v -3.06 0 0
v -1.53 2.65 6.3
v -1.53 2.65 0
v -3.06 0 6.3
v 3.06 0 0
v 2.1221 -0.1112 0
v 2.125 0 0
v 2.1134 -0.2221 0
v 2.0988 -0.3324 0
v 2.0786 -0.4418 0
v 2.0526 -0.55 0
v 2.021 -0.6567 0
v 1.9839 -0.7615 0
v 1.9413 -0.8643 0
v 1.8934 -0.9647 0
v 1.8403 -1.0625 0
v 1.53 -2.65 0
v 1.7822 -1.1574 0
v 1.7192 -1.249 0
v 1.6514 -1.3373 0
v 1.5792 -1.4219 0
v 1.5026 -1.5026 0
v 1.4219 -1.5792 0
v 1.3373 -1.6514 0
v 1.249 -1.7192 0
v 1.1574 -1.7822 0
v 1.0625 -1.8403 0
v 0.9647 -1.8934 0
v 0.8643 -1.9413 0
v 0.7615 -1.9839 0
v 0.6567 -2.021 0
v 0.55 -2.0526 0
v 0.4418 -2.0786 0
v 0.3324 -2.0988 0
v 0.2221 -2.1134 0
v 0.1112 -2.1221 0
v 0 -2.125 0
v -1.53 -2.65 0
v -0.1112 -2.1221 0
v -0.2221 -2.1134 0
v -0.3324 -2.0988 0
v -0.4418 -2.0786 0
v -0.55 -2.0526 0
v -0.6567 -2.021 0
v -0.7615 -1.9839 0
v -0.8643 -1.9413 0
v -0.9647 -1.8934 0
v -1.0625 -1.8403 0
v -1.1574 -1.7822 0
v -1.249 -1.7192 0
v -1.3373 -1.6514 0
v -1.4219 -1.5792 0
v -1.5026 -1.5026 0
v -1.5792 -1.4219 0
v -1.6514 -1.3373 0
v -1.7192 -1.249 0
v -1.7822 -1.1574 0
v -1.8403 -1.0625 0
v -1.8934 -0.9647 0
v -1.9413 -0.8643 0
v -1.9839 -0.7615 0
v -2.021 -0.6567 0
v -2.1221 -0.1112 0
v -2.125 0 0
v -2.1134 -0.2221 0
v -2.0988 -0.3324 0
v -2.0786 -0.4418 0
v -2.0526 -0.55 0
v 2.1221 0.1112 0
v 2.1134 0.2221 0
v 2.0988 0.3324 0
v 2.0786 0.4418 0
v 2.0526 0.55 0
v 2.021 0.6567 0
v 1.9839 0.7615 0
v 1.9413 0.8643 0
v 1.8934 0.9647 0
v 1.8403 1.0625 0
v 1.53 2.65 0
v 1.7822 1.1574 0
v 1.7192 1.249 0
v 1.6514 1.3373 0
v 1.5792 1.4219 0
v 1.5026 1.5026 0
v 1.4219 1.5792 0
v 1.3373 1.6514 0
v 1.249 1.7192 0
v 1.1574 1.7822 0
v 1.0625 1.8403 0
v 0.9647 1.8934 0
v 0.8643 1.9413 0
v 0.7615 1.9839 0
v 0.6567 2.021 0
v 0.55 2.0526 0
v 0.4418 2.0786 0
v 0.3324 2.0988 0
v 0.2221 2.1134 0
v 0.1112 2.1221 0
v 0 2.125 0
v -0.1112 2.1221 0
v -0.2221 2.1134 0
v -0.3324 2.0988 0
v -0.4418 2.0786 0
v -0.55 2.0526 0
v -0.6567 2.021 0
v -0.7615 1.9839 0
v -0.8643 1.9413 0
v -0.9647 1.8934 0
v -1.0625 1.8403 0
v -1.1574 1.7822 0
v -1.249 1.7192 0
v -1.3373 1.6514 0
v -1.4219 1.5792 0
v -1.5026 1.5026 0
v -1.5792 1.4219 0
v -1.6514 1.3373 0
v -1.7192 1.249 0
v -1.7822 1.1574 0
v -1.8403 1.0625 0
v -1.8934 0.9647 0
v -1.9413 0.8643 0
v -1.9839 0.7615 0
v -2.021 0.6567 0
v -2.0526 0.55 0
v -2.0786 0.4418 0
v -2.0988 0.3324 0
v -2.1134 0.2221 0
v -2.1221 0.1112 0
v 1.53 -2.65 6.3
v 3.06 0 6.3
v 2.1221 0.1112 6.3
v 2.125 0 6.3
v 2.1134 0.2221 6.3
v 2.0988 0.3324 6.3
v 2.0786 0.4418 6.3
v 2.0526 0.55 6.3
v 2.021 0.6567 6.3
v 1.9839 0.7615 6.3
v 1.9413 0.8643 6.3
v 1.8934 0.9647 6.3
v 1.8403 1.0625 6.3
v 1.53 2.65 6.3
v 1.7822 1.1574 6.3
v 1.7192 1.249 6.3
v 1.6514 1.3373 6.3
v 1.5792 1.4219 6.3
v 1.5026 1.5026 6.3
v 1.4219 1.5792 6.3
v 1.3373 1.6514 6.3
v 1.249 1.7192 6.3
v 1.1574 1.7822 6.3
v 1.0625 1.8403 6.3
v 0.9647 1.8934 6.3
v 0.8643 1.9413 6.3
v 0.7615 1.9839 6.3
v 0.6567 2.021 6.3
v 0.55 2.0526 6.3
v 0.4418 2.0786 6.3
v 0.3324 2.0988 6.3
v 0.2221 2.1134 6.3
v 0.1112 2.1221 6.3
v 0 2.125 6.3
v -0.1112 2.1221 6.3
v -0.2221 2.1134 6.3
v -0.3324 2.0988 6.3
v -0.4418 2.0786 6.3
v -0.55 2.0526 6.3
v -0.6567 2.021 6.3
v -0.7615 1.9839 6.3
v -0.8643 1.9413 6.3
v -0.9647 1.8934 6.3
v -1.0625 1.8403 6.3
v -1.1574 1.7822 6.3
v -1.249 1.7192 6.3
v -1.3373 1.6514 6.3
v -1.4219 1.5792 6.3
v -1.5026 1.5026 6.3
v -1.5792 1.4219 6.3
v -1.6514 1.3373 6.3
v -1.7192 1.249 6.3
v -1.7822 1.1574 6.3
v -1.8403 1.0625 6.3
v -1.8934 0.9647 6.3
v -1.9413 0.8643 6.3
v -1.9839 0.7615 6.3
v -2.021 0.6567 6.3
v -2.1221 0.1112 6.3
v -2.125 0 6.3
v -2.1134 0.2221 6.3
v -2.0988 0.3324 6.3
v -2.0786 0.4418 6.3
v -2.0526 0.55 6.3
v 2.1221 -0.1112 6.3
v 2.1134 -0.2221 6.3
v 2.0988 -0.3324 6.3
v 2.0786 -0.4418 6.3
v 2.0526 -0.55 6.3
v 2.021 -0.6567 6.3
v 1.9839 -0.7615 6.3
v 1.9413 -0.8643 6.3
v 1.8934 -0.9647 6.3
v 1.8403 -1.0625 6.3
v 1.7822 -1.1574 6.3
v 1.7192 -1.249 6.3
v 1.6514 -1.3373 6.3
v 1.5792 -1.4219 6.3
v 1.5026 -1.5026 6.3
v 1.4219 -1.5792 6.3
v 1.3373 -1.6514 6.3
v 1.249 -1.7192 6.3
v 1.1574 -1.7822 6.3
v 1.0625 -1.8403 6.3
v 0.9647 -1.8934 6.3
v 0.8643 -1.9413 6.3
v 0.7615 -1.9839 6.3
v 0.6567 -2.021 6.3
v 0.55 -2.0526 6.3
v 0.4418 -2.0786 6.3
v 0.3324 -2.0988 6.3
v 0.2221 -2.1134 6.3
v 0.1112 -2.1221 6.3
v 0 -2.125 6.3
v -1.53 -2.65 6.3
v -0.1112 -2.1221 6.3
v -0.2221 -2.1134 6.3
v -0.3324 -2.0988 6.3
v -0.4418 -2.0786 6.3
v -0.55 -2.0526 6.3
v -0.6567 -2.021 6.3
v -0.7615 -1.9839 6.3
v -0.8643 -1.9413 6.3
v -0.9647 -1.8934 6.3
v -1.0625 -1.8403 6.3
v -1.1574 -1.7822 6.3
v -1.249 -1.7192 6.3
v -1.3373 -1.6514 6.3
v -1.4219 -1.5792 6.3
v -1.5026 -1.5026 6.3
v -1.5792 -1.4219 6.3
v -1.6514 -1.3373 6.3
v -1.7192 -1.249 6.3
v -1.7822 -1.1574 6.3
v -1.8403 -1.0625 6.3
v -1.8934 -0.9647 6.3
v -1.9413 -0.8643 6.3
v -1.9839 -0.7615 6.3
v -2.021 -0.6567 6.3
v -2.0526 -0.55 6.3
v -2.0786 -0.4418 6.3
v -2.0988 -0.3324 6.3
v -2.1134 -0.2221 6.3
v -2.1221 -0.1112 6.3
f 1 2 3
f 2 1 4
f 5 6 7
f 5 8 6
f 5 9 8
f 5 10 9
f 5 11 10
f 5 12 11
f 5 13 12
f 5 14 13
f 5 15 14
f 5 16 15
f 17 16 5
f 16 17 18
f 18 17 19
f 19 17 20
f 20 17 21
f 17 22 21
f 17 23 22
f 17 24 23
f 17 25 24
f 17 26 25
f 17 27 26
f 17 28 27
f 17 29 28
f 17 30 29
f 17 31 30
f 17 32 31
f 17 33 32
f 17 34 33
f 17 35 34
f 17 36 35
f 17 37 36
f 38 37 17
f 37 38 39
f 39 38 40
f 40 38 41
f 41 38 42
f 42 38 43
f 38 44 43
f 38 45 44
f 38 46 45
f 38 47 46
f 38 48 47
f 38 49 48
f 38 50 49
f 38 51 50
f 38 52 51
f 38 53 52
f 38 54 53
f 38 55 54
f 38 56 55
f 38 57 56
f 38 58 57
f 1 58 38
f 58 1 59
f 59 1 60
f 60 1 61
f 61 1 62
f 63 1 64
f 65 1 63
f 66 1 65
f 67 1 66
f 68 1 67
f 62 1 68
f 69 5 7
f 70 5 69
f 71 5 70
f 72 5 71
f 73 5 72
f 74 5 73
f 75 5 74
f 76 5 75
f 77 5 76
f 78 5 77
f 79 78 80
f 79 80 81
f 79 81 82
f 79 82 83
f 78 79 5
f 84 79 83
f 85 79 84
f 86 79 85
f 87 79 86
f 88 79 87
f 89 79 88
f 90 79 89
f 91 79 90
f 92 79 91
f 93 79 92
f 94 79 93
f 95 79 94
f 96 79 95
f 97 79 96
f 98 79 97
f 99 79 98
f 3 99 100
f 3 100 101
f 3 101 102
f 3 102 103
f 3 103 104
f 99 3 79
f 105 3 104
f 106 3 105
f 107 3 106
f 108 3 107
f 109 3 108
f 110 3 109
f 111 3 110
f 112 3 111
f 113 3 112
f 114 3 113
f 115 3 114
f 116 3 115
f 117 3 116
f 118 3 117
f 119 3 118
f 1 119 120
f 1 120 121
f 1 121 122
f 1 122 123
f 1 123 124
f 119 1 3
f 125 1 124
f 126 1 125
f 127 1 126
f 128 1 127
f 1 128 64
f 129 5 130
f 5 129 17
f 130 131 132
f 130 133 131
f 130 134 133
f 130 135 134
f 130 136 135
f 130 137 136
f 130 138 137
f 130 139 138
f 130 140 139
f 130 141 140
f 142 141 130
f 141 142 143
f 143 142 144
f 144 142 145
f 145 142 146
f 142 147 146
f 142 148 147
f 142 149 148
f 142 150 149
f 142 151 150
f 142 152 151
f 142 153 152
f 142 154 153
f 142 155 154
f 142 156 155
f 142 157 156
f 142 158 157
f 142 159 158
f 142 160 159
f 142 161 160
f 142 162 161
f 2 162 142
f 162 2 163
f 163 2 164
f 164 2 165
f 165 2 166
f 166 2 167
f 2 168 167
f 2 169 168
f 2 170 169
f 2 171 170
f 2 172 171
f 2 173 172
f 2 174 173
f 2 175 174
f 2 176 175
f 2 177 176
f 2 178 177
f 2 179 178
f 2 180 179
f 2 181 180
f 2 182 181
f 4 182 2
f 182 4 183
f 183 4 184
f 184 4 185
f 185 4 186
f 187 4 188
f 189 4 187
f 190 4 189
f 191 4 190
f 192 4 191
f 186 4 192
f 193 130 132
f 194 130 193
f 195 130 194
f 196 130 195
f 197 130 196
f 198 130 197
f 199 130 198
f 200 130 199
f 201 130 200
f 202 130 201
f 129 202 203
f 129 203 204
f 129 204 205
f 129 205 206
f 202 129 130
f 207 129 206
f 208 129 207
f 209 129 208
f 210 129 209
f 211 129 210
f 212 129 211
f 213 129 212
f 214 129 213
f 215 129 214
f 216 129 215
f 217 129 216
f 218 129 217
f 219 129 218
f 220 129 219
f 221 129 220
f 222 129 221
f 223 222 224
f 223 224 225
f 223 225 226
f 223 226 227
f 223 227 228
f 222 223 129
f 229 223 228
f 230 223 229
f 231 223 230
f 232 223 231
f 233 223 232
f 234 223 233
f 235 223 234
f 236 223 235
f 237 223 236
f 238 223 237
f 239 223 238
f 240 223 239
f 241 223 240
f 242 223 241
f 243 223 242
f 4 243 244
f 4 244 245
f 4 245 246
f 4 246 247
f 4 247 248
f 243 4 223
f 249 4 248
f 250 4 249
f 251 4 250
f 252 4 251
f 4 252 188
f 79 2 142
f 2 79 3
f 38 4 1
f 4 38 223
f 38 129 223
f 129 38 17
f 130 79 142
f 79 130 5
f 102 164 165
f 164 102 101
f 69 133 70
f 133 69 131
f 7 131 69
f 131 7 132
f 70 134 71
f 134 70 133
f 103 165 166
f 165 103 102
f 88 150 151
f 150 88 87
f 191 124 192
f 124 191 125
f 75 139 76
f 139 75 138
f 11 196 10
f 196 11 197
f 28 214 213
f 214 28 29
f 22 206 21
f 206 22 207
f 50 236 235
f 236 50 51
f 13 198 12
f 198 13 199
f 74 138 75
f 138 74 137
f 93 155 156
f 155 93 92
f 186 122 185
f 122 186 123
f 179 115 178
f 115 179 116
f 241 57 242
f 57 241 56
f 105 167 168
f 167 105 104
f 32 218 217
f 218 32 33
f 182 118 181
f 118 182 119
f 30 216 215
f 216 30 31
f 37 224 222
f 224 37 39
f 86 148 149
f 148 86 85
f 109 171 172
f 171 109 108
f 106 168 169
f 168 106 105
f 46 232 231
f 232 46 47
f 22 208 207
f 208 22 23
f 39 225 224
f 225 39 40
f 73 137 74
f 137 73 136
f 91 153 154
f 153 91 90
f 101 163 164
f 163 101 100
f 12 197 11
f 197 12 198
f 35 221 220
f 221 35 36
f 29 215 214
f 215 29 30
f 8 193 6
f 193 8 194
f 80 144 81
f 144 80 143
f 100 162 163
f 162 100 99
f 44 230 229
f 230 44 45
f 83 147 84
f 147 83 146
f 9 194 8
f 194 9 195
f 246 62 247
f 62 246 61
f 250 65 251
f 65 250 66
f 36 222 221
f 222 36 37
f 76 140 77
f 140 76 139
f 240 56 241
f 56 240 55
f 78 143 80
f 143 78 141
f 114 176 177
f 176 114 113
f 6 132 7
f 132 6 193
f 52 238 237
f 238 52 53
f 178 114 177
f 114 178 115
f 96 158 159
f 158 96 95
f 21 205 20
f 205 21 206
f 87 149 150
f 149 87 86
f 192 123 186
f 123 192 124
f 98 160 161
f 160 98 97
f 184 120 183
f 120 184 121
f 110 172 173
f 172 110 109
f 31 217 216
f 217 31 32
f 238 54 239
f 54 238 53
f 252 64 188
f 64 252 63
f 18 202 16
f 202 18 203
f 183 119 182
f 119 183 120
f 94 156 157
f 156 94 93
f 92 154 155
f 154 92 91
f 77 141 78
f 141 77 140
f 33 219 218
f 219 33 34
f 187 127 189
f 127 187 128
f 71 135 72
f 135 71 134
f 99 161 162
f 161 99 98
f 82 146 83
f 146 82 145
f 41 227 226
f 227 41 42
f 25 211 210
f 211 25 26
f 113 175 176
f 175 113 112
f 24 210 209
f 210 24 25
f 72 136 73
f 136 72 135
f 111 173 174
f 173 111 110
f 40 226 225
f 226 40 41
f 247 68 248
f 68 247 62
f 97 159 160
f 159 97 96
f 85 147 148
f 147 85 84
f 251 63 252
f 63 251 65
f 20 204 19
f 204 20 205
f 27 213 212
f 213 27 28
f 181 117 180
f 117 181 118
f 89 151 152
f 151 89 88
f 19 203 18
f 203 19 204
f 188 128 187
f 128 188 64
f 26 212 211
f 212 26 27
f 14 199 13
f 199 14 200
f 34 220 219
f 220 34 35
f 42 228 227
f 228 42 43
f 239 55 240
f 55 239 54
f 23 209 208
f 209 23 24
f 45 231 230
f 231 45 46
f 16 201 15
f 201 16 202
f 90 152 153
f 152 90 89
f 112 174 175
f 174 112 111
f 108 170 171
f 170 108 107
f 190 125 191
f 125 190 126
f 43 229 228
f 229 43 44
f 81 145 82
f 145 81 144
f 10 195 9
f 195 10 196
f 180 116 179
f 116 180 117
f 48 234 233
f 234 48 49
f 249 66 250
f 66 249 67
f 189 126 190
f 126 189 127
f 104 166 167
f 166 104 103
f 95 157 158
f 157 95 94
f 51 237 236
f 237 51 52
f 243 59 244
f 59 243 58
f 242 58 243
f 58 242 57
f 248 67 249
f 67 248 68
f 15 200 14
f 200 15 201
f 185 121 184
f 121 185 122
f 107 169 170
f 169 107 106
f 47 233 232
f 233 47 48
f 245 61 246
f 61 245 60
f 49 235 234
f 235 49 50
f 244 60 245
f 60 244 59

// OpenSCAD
$fn = 120;

screw_d = 4.0;          // mm
across_flats = 5.3;     // mm
thickness = 6.3;        // mm

clearance = 0.25;       // mm added to screw diameter for clearance
hole_d = screw_d + clearance;

module hex_prism_af(af, h) {
    // For a regular hexagon: across_flats = 2 * apothem
    // Circumradius R = apothem / cos(30) = (af/2) / cos(30)
    R = (af/2) / cos(30);
    linear_extrude(height = h)
        polygon(points = [for (i = [0:5]) [R*cos(60*i), R*sin(60*i)]]);
}

difference() {
    hex_prism_af(across_flats, thickness);
    translate([0,0,-0.1])
        cylinder(d = hole_d, h = thickness + 0.2);
}
